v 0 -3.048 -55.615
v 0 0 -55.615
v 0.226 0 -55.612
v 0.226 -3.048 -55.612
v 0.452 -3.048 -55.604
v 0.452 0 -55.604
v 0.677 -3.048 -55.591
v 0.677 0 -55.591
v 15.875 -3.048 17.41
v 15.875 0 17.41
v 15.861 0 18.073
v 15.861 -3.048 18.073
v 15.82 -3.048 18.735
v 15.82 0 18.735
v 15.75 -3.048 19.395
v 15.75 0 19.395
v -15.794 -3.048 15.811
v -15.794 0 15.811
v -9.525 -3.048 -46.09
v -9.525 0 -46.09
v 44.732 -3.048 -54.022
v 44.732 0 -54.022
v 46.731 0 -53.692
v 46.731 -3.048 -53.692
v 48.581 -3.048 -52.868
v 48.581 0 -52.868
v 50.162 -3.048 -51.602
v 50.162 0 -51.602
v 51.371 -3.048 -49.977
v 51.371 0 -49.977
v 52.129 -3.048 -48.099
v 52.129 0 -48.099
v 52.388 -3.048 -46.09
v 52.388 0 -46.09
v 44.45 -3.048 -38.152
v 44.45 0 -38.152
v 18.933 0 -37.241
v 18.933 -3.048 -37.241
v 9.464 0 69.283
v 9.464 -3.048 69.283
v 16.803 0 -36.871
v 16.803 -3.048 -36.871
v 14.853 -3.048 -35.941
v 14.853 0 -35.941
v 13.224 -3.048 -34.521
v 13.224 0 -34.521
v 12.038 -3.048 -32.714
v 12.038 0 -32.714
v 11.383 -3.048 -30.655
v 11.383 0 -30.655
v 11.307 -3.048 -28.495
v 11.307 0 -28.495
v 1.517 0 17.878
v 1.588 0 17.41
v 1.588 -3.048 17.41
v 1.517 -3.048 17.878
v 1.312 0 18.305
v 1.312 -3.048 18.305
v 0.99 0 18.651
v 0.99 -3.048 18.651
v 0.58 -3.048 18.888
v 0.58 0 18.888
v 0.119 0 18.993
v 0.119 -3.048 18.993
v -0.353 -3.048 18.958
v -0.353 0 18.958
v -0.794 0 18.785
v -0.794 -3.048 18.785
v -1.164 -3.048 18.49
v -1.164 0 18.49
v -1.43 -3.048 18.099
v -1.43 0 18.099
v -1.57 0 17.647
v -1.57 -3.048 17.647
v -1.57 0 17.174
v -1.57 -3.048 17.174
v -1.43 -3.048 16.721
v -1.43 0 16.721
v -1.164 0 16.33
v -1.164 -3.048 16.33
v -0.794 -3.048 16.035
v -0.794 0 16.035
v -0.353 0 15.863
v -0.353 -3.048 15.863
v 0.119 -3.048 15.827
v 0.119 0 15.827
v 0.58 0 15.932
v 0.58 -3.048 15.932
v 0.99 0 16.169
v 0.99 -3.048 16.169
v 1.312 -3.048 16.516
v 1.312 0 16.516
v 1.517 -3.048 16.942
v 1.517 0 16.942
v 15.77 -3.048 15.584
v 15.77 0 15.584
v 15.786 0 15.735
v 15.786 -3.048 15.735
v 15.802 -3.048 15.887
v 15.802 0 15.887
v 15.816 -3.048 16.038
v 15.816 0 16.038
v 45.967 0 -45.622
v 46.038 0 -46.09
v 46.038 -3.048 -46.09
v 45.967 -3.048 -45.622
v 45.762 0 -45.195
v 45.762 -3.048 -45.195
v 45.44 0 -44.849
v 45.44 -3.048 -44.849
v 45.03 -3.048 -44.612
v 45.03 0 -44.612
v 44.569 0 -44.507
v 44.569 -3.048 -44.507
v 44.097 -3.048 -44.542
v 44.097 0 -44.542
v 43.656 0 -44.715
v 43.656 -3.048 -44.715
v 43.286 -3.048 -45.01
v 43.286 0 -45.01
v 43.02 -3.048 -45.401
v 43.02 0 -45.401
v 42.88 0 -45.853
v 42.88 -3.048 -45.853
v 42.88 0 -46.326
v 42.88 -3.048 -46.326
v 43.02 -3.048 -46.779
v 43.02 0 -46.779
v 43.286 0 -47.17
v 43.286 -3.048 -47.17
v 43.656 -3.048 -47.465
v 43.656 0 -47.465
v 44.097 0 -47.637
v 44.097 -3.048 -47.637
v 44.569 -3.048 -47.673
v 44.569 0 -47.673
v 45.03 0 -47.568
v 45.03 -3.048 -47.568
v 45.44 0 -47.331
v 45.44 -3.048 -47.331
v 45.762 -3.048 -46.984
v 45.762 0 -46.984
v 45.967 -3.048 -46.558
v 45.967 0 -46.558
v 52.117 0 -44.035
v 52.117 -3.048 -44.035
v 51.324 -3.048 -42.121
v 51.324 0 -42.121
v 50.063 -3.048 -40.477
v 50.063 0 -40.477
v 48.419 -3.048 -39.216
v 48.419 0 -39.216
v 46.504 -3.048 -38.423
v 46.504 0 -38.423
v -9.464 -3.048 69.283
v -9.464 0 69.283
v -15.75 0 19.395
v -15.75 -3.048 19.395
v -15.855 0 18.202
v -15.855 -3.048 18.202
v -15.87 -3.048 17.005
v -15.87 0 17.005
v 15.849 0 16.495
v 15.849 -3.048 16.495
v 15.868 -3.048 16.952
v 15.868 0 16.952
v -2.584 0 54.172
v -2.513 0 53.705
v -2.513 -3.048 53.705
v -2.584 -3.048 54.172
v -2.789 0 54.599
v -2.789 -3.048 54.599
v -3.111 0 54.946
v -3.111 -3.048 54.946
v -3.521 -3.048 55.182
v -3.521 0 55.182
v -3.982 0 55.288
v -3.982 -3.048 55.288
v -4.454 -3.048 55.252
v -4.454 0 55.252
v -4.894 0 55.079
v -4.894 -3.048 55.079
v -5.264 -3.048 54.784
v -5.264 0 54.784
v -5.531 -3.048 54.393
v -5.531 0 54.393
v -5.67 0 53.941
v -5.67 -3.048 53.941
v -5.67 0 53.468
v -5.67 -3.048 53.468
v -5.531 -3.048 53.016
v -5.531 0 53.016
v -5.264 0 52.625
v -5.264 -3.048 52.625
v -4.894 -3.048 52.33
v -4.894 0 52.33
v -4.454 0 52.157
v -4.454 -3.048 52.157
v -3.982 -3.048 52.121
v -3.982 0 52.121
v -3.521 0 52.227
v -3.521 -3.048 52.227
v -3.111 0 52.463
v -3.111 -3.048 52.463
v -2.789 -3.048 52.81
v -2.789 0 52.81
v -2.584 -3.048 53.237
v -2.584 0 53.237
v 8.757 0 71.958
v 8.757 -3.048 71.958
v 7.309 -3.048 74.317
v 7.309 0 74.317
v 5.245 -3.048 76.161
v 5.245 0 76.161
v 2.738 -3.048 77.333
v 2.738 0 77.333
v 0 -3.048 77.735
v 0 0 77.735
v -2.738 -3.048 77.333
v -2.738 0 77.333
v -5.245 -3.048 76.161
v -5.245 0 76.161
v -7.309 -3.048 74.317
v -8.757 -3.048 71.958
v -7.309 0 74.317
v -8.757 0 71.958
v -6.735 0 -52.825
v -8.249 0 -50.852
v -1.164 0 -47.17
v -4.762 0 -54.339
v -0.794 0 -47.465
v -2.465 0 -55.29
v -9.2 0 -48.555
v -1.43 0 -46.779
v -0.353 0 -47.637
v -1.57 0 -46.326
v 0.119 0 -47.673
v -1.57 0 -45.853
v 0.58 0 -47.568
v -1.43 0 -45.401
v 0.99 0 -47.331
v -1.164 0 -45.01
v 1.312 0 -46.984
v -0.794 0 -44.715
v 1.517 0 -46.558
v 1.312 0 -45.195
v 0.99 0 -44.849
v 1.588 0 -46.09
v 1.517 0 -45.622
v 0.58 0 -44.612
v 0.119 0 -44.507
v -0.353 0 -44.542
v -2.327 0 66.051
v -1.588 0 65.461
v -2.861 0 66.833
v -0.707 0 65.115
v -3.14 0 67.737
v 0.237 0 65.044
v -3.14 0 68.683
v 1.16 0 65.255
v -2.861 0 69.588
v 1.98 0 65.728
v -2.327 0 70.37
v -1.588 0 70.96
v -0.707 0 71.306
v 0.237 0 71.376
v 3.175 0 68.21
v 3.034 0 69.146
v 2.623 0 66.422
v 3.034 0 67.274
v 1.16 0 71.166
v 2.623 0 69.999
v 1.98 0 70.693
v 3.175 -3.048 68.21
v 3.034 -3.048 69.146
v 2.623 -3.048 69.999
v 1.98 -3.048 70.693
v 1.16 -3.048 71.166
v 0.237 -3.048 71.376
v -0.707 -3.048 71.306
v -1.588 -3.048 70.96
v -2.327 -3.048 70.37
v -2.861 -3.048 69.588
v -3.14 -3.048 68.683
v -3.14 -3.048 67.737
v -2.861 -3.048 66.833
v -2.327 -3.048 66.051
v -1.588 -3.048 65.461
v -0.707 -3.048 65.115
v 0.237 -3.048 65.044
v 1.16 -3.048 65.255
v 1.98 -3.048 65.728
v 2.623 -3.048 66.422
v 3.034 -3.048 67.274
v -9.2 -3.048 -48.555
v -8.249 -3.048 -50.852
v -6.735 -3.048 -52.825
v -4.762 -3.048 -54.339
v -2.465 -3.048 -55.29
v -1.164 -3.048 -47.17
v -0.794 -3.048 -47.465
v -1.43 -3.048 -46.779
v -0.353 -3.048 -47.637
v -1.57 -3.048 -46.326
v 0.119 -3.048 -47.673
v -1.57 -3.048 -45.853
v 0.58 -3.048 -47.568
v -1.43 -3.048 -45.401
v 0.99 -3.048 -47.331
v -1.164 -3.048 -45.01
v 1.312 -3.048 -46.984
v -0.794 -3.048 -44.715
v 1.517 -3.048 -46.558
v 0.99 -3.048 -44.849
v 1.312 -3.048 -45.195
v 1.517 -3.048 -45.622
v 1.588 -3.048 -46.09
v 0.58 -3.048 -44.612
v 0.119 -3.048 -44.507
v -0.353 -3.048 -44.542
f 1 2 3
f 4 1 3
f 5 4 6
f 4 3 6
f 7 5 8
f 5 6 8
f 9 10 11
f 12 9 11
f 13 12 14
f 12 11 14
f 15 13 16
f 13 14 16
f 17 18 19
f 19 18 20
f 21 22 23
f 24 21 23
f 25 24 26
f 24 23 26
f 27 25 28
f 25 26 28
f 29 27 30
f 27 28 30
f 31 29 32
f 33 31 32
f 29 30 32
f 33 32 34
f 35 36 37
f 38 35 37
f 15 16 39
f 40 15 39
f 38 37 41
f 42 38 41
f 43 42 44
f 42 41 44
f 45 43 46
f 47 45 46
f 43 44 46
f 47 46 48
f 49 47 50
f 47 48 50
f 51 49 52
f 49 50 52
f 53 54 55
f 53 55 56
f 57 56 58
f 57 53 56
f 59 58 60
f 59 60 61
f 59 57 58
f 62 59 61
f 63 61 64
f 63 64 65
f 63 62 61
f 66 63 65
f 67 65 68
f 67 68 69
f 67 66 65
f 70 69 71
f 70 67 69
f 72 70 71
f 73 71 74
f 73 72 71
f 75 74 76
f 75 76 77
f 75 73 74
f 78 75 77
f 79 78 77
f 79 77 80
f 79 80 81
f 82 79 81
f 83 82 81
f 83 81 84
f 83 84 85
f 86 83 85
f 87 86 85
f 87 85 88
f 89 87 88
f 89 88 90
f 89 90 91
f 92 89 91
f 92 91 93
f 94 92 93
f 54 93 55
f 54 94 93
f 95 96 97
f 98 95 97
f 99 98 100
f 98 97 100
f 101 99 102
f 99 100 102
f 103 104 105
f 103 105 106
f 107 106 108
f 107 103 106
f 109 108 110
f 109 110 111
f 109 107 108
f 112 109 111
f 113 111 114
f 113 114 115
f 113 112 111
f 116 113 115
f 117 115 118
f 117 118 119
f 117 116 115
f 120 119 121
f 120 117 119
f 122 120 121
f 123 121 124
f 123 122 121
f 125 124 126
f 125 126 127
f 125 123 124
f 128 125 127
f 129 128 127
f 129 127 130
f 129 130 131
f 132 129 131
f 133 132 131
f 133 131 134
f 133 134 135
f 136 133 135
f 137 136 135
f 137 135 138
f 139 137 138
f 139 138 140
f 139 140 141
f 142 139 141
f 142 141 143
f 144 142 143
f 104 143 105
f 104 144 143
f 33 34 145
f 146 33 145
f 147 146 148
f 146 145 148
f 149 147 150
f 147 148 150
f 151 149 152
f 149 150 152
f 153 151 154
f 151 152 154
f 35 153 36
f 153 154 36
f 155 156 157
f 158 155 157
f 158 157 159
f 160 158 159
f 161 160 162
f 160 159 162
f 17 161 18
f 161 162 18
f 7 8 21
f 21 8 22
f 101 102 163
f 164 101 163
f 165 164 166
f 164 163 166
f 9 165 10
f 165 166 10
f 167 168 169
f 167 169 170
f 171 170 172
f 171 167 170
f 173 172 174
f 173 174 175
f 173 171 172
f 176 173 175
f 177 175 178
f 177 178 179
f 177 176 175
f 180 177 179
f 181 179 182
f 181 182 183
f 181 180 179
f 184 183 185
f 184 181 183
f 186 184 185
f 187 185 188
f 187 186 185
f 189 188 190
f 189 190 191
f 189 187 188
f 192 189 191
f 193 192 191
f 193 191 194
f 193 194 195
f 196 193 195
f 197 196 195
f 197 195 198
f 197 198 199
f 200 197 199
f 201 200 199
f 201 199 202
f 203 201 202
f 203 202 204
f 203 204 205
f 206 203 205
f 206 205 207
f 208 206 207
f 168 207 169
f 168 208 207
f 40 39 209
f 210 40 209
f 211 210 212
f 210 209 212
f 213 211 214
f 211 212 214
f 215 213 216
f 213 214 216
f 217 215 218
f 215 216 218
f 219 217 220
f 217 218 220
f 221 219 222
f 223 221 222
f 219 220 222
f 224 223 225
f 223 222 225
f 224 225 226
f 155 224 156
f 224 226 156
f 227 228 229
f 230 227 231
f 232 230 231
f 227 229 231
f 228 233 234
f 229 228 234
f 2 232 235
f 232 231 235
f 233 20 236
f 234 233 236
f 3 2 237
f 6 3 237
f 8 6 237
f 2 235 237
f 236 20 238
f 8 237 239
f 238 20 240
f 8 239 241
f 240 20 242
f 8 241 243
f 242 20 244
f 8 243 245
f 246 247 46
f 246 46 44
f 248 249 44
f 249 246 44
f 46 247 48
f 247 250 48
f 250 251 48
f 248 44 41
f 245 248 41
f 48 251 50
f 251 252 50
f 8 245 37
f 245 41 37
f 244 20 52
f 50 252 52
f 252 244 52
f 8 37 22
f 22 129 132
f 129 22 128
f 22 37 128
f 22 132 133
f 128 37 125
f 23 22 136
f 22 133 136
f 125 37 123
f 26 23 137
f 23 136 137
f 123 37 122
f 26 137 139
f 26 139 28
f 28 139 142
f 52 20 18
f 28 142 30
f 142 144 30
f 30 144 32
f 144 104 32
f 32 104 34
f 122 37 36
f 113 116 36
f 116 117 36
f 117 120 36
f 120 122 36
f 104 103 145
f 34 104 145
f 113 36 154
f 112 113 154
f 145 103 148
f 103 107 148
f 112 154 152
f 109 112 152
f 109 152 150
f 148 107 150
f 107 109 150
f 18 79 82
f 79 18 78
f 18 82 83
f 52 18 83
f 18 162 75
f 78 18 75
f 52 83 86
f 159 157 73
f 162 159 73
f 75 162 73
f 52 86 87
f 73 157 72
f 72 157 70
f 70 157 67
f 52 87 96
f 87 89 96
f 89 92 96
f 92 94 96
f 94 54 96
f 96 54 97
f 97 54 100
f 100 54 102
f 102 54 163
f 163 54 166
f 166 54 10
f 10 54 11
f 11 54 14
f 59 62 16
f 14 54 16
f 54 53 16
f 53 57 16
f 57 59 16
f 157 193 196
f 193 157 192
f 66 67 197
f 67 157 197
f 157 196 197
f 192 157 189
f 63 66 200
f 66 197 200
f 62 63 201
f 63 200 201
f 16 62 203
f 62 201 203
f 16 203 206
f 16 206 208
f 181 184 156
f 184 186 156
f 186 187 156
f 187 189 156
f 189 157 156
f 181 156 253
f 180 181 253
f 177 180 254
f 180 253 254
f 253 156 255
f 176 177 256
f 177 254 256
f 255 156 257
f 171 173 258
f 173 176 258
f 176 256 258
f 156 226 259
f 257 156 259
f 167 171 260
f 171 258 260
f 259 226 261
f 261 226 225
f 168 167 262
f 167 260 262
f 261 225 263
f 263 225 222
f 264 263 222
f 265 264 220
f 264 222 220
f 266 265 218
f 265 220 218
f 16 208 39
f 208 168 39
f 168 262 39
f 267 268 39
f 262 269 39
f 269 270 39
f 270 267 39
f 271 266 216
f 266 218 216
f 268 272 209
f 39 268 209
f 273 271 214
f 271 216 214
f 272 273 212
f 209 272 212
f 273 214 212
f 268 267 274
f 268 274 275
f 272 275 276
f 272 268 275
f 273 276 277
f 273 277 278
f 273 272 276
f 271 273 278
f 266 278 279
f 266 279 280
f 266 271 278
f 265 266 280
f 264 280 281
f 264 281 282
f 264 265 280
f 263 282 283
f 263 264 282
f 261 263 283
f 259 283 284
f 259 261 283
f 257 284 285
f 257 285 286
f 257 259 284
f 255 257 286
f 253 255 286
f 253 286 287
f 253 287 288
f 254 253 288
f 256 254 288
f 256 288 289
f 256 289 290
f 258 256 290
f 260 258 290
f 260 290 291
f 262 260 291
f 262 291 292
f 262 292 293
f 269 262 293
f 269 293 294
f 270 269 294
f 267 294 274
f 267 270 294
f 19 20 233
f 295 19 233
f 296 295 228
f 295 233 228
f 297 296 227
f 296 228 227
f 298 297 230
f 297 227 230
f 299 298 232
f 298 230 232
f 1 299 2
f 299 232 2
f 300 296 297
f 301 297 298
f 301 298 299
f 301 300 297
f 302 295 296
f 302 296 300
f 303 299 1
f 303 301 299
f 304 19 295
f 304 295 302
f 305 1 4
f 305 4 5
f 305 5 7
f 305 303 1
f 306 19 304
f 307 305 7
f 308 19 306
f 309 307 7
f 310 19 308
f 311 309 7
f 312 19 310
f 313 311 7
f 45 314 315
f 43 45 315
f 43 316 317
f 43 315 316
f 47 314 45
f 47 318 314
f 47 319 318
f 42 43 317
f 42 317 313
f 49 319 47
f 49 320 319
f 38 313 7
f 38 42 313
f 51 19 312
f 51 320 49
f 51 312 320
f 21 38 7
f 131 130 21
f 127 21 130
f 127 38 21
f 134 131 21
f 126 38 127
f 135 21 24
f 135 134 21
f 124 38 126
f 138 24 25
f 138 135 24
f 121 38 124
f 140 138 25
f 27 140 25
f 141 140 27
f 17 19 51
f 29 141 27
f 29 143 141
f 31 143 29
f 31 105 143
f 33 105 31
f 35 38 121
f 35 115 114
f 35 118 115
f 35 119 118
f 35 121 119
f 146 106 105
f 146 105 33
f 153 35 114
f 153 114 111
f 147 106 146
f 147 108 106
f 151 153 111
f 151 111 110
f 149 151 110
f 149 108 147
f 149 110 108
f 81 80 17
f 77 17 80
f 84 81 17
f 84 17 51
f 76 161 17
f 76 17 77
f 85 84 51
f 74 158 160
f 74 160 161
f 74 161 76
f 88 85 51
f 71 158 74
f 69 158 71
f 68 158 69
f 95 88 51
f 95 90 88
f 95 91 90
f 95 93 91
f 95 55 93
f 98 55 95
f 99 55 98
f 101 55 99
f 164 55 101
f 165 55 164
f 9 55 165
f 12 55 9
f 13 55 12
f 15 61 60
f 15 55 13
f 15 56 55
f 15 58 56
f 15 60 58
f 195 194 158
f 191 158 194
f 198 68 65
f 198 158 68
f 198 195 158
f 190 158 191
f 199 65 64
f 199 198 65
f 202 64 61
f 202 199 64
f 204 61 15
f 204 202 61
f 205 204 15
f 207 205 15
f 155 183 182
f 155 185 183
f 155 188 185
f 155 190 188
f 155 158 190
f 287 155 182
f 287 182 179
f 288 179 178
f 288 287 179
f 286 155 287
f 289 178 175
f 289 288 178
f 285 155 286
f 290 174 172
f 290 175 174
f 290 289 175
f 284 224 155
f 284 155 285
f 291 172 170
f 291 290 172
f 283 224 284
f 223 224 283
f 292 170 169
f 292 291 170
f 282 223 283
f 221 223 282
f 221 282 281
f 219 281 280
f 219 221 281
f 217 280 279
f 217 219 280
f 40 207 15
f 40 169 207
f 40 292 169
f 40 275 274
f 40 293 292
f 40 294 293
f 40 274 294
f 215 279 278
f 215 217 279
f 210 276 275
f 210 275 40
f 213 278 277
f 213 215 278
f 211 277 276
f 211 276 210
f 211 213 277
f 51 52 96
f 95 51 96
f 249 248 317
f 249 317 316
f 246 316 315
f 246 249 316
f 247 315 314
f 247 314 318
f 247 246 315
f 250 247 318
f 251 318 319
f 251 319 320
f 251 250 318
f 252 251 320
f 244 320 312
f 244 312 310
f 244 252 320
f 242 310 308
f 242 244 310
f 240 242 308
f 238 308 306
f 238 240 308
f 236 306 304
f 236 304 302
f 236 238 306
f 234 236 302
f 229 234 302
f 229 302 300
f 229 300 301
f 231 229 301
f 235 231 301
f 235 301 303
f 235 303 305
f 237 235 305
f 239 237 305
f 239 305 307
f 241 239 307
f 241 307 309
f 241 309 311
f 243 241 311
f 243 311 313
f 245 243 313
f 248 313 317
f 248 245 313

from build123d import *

# Parameters (mm, degrees)
F0_R     = 3.175
F0_R_2   = 1.5875
F1_DEPTH = 3.048


with BuildPart() as f1:
    # F0 (on Front) → F1 (new body)
    with BuildSketch(Plane.XZ):
        with BuildLine():
            ThreePointArc((-9.464408, 69.282927), (-0.537188, 58.700422), (9.525, 68.210262))
            ThreePointArc((9.525, 68.210262), (9.50984, 68.74745), (9.464408, 69.282927))
            ThreePointArc((9.464408, 69.282927), (0, 77.735262), (-9.464408, 69.282927))
        make_face()
        with Locations((0, 68.210262)):
            Circle(F0_R, mode=Mode.SUBTRACT)
        with BuildLine():
            ThreePointArc((9.464408, 69.282927), (9.50984, 68.74745), (9.525, 68.210262))
            ThreePointArc((9.525, 68.210262), (-0.537188, 58.700422), (-9.464408, 69.282927))
            Line((-9.464408, 69.282927), (-15.750459, 19.394869))
            ThreePointArc((-15.750459, 19.394869), (0, 33.285262), (15.750459, 19.394869))
            Line((15.750459, 19.394869), (9.464408, 69.282927))
        make_face()
        with Locations((-4.10057, 53.704553)):
            Circle(F0_R_2, mode=Mode.SUBTRACT)
        with BuildLine():
            ThreePointArc((15.875, 17.410262), (15.843834, 18.404518), (15.750459, 19.394869))
            ThreePointArc((15.750459, 19.394869), (0, 33.285262), (-15.750459, 19.394869))
            ThreePointArc((-15.750459, 19.394869), (-15.873818, 17.603994), (-15.794203, 15.810642))
            ThreePointArc((-15.794203, 15.810642), (-0.113839, 1.53567), (15.769637, 15.584293))
            Line((15.769637, 15.584293), (15.815592, 16.038155))
            ThreePointArc((15.815592, 16.038155), (15.860141, 16.723566), (15.875, 17.410262))
        make_face()
        with Locations((0, 17.410262)):
            Circle(F0_R_2, mode=Mode.SUBTRACT)
        with BuildLine():
            ThreePointArc((15.769637, 15.584293), (-0.113839, 1.53567), (-15.794203, 15.810642))
            Line((-15.794203, 15.810642), (-9.525, -46.089738))
            ThreePointArc((-9.525, -46.089738), (0, -36.564738), (9.525, -46.089738))
            ThreePointArc((9.525, -46.089738), (6.970557, -52.581037), (0.677344, -55.590624))
            Line((0.677344, -55.590624), (44.732405, -54.022212))
            ThreePointArc((44.732405, -54.022212), (36.513756, -46.230963), (44.45, -38.152238))
            Line((44.45, -38.152238), (18.932522, -37.240899))
            ThreePointArc((18.932522, -37.240899), (13.224065, -34.520616), (11.306519, -28.494884))
            Line((11.306519, -28.494884), (15.769637, 15.584293))
        make_face()
        with BuildLine():
            ThreePointArc((15.769637, 15.584293), (15.794245, 15.811059), (15.815592, 16.038155))
            Line((15.815592, 16.038155), (15.769637, 15.584293))
        make_face()
        with BuildLine():
            ThreePointArc((9.525, -46.089738), (0, -36.564738), (-9.525, -46.089738))
            ThreePointArc((-9.525, -46.089738), (-6.735192, -52.82493), (0, -55.614738))
            Line((0, -55.614738), (0.677344, -55.590624))
            ThreePointArc((0.677344, -55.590624), (6.970557, -52.581037), (9.525, -46.089738))
        make_face()
        with Locations((0, -46.089738)):
            Circle(F0_R_2, mode=Mode.SUBTRACT)
        with BuildLine():
            Line((0.677344, -55.590624), (0, -55.614738))
            ThreePointArc((0, -55.614738), (0.338886, -55.608707), (0.677344, -55.590624))
        make_face()
        with BuildLine():
            ThreePointArc((52.3875, -46.089738), (50.06266, -40.477078), (44.45, -38.152238))
            ThreePointArc((44.45, -38.152238), (36.513756, -46.230963), (44.732405, -54.022212))
            ThreePointArc((44.732405, -54.022212), (50.161633, -51.601648), (52.3875, -46.089738))
        make_face()
        with Locations((44.45, -46.089738)):
            Circle(F0_R_2, mode=Mode.SUBTRACT)
    extrude(amount=F1_DEPTH)


solid = f1.part
